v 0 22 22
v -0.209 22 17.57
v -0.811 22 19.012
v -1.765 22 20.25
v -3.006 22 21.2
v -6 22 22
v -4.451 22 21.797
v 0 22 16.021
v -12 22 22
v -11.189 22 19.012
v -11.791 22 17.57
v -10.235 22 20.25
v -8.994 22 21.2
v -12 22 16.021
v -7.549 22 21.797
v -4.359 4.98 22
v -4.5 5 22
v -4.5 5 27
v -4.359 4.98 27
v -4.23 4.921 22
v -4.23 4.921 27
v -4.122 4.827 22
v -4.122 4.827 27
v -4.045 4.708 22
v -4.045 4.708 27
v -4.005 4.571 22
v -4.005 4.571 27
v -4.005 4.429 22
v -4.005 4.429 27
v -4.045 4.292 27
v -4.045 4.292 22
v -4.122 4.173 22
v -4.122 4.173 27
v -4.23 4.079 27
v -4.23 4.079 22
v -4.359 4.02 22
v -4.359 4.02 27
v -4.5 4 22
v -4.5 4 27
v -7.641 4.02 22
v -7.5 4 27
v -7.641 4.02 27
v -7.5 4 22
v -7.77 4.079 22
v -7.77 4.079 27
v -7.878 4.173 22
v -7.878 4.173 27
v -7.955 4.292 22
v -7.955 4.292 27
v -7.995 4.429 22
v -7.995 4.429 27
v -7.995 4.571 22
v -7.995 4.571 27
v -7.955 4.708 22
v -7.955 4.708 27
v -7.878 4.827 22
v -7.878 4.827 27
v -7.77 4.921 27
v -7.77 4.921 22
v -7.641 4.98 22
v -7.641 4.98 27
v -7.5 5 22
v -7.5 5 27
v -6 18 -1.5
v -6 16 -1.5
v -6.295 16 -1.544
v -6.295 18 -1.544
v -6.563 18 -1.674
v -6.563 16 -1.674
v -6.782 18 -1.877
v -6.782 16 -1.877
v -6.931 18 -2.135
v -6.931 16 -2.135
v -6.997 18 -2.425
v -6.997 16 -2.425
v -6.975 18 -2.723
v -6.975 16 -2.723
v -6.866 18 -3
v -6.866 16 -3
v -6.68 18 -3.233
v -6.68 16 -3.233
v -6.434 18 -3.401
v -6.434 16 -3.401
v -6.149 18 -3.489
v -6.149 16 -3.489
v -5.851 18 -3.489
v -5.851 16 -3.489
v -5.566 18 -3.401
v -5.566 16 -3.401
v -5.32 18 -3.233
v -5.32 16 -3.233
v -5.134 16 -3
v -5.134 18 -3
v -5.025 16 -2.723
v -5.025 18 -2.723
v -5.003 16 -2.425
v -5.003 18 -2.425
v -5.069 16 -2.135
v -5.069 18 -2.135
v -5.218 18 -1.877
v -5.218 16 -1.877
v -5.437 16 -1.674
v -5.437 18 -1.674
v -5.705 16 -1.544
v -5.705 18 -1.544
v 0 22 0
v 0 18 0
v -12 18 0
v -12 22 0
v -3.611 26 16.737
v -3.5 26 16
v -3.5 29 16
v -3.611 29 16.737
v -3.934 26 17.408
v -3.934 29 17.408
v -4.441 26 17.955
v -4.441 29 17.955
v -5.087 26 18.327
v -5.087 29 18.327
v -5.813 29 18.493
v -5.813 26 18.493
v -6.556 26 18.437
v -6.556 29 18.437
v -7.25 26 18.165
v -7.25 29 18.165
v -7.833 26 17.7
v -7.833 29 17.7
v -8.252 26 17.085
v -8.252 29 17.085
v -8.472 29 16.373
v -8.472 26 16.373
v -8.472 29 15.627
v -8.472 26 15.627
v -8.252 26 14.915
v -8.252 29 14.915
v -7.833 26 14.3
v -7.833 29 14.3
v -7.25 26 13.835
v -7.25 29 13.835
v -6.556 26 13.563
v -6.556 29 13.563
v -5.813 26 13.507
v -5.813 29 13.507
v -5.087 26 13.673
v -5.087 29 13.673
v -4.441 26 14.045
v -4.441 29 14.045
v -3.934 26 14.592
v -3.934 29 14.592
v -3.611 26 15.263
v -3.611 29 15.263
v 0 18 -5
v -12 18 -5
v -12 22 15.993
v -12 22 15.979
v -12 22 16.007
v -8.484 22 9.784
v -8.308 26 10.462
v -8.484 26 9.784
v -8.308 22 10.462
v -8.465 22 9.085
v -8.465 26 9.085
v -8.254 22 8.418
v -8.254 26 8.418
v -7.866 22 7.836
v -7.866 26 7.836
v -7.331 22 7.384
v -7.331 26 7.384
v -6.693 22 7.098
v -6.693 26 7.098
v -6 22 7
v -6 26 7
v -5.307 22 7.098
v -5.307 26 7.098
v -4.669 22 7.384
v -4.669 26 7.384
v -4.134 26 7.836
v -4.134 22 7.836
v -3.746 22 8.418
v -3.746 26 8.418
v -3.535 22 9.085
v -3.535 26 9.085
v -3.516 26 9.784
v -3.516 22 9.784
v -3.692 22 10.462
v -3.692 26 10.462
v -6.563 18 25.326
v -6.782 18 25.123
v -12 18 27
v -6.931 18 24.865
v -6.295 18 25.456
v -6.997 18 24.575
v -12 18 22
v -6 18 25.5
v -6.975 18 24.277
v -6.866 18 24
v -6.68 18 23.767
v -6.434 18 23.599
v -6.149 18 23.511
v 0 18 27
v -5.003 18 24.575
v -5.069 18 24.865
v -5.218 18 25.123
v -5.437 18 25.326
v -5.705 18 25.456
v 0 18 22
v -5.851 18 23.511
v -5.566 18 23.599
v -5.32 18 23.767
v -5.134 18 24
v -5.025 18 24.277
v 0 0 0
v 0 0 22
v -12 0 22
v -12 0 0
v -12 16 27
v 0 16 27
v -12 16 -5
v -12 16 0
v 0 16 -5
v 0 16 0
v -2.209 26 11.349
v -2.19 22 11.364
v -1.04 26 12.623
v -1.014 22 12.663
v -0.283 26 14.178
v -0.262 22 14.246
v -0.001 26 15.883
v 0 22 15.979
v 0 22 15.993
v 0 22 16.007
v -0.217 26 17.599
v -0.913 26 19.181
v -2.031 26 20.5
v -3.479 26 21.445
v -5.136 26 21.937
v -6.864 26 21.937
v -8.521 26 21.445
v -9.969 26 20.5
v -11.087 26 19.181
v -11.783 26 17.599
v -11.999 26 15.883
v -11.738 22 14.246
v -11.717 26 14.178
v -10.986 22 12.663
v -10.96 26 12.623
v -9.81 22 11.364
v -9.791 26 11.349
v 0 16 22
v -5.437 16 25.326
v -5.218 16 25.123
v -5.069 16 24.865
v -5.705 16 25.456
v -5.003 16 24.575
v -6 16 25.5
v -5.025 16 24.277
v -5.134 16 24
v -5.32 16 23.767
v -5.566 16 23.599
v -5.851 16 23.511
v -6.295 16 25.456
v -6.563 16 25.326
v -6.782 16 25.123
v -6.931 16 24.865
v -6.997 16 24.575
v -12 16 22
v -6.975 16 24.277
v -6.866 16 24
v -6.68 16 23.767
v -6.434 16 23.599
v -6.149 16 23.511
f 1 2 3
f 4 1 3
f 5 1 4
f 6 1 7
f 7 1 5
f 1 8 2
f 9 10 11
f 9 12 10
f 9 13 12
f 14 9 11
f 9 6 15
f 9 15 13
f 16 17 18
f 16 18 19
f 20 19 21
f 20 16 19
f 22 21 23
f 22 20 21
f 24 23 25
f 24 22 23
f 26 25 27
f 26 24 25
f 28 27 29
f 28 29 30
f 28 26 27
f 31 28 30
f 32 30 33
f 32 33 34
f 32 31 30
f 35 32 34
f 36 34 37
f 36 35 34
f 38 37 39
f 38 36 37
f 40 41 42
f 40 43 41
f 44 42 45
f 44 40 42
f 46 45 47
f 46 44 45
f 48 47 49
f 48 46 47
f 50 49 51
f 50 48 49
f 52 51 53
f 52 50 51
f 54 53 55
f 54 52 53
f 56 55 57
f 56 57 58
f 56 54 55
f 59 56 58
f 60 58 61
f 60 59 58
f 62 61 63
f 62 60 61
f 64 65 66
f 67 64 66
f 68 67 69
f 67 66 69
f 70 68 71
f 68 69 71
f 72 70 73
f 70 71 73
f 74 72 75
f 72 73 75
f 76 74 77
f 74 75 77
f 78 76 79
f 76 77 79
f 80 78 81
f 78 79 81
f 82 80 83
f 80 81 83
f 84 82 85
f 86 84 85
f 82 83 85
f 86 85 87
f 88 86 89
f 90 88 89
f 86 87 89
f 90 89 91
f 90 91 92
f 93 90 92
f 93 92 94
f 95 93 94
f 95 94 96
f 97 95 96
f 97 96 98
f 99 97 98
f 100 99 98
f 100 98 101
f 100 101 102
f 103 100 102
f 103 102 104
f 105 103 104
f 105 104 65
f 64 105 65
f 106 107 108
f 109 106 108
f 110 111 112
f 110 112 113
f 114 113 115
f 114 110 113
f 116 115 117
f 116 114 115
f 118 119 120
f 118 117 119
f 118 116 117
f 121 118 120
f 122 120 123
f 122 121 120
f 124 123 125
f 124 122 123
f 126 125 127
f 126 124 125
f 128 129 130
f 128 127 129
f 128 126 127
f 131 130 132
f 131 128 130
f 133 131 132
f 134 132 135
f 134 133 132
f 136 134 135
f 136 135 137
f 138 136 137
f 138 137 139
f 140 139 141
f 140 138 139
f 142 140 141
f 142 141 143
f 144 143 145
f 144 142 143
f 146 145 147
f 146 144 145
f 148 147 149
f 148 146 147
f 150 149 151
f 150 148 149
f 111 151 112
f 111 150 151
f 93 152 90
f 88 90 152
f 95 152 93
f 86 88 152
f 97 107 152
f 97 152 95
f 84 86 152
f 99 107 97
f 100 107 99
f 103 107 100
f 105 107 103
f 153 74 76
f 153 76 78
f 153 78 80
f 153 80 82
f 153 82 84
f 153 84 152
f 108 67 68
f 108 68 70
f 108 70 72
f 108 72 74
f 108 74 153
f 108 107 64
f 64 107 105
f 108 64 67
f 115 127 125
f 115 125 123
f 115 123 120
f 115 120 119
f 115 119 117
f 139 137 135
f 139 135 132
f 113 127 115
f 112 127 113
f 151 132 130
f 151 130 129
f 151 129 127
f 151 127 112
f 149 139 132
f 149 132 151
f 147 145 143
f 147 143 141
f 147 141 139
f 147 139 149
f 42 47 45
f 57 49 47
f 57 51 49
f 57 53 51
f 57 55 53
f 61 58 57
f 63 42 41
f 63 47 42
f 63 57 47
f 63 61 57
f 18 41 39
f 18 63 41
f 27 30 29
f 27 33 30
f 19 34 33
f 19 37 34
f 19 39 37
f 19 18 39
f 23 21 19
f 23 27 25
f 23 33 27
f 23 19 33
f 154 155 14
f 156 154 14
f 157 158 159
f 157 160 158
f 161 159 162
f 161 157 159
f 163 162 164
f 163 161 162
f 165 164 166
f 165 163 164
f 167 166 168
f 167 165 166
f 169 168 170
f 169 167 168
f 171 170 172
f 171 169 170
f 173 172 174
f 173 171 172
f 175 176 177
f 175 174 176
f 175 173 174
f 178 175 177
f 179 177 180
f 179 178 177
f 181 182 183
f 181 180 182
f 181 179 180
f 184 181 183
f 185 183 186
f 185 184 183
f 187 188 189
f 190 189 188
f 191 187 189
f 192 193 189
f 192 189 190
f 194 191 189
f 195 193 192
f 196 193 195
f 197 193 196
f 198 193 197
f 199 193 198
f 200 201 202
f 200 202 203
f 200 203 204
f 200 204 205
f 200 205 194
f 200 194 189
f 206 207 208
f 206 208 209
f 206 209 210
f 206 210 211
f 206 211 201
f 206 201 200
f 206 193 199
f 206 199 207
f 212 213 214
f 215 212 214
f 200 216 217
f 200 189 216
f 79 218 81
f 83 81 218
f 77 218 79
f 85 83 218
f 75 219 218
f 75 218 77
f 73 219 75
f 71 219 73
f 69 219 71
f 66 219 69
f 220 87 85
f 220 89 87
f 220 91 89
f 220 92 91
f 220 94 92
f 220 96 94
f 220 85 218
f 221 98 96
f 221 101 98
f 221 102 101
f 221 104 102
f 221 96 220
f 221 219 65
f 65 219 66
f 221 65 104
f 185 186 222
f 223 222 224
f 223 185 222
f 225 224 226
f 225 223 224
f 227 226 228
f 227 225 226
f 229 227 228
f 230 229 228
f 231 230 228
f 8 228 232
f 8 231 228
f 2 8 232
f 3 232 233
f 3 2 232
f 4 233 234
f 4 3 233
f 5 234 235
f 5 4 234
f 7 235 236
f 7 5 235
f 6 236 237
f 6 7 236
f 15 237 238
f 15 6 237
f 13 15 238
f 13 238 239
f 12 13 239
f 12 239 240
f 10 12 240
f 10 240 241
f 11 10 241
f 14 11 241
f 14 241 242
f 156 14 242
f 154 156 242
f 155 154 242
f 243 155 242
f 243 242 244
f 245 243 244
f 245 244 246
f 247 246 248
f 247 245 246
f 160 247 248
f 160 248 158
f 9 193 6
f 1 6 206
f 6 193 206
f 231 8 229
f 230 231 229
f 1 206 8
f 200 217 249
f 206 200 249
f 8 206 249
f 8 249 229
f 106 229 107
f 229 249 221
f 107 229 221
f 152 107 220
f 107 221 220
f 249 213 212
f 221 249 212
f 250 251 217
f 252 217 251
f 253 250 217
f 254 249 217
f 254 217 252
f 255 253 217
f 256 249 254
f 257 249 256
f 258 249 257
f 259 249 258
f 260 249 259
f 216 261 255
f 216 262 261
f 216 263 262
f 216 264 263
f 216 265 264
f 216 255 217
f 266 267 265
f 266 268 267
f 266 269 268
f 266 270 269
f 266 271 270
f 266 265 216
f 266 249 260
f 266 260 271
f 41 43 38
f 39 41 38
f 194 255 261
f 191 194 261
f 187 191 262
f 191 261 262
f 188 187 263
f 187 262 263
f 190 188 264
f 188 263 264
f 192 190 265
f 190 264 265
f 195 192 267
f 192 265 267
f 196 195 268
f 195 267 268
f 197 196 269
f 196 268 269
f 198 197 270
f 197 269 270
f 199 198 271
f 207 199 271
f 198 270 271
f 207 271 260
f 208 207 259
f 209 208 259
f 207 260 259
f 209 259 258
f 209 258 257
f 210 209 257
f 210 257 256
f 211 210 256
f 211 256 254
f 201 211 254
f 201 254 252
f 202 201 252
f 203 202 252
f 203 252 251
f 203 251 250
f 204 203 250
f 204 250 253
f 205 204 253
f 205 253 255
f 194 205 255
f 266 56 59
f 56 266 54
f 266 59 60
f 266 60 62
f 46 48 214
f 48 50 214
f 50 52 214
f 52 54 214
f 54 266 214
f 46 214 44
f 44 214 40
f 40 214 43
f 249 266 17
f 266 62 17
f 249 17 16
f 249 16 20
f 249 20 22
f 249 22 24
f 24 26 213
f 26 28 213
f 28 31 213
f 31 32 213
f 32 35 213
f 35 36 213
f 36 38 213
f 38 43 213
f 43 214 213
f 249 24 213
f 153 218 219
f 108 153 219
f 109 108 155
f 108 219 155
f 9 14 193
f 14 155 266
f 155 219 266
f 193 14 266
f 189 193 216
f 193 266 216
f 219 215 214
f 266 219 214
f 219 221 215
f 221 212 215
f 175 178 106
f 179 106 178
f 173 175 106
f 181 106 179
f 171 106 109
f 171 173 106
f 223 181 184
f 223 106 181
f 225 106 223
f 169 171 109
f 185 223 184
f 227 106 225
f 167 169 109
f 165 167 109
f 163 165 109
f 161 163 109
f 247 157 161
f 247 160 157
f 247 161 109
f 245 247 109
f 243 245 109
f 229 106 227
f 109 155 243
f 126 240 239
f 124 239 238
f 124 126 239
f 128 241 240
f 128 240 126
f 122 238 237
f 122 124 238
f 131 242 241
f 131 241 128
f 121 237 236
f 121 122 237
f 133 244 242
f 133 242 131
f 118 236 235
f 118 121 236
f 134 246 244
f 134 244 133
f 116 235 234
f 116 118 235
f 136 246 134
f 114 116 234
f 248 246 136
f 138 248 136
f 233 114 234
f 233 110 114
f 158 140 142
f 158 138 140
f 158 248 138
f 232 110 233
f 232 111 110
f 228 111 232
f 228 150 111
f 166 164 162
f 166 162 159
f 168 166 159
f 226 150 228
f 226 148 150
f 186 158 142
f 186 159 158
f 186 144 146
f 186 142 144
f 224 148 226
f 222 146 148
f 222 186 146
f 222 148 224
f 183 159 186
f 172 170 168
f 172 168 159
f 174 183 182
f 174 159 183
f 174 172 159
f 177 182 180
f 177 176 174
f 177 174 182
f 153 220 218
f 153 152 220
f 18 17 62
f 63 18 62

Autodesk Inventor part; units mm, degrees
ref_plane "YZ Plane" through (0, 0, 0) normal (1, 0, 0) x (0, 1, 0)
ref_plane "XZ Plane" through (0, 0, 0) normal (0, 1, 0) x (-1, 0, 0)
ref_plane "XY Plane" through (0, 0, 0) normal (0, 0, 1) x (1, 0, 0)
sketch "Szkic1" plane through (0, 0, 0) normal (0, 1, 0) x (-1, 0, 0)
  line L0 (0, 0) -> (12, 0)
  line L1 (12, 0) -> (12, 22)
  line L2 (12, 22) -> (0, 22)
  line L3 (0, 22) -> (0, 0)
  dimension "d0" = 12
  dimension "d1" = 22
extrude "Wyciągnięcie proste1" add sketch "Szkic1" along normal blind 22
sketch "Szkic2" plane through (-12, 0, 22) normal (0, 0, 1) x (1, 0, 0)
  line L0 (0, 0) -> (0, 22) projected
  line L1 (12, 0) -> (12, 22) projected
  line L2 (0, 18) -> (12, 18)
  line L3 (12, 18) -> (12, 16)
  line L4 (12, 16) -> (0, 16)
  line L5 (0, 16) -> (0, 18)
  line L6 (0, 22) -> (12, 22) projected
  dimension "d4" = 2
  dimension "d5" = 4
extrude "Wyciągnięcie proste2" add sketch "Szkic2" along normal blind 5 contours L0 L2 L1 L4
sketch "Szkic3" plane through (0, 0, 0) normal (0, 0, -1) x (-1, 0, 0)
  line L0 (0, 16) -> (0, 18) projected
  line L1 (12, 16) -> (0, 16) projected
  line L2 (0, 18) -> (12, 18)
  line L3 (12, 18) -> (12, 16)
  line L4 (12, 16) -> (0, 16)
  line L5 (0, 16) -> (0, 18)
  point P0 (0, 0)
extrude "Wyciągnięcie proste3" add sketch "Szkic3" along normal blind 5
sketch "Szkic4" plane through (-12, 18, 0) normal (0, 1, 0) x (1, 0, 0)
  line L0 (0, 5) -> (12, 5) projected
  point P0 (12, 0)
  point P1 (6, 2.5)
  point P2 (6, -24.839)
  dimension "d10" = 2.5
hole "Otwór1" at (-6, 18, -2.5) direction (0, -1, 0) diameter 2 end through all
sketch "Szkic5" plane through (-12, 18, 22) normal (0, 1, 0) x (1, 0, 0)
  line L0 (12, -5) -> (0, -5) projected
  point P0 (12, 22)
  point P1 (6, -2.5)
  dimension "d18" = 2.5
hole "Otwór2" at (-6, 18, 24.5) direction (0, -1, 0) diameter 2 end through all
sketch "Szkic6" plane through (0, 22, 0) normal (0, 1, 0) x (1, 0, 0)
  line L0 (-12, -22) -> (0, -22) projected
  arc A0 (-8.3077, -10.4615) -> (-3.6923, -10.4615) centre (-6, -16) ccw
  line L1 (0, 0) -> (-12, 0) projected
  arc A1 (-3.6923, -10.4615) -> (-8.3077, -10.4615) centre (-6, -9.5) ccw
  dimension "d26" = 6
  dimension "d27" = 9.5
  dimension "d28" = 5
extrude "Wyciągnięcie proste4" add sketch "Szkic6" along normal blind 4
sketch "Szkic7" plane through (0, 26, 0) normal (0, 1, 0) x (1, 0, 0)
  circle A0 centre (-6, -16) radius 2.5
  arc A1 (-8.3077, -10.4615) -> (-3.6923, -10.4615) centre (-6, -16) ccw projected
  point P0 (0, 0)
  dimension "d31" = 5
extrude "Wyciągnięcie proste5" add sketch "Szkic7" along normal blind 3
sketch "Szkic8" plane through (-12, 0, 22) normal (0, 0, 1) x (1, 0, 0)
  line L0 (4.5, 4) -> (7.5, 4)
  line L1 (8, 4.5) -> (8, 4.5)
  line L2 (7.5, 5) -> (4.5, 5)
  line L3 (4, 4.5) -> (4, 4.5)
  line L4 (0, 0) -> (12, 0) projected
  line L5 (12, 0) -> (12, 16) projected
  arc A0 (4.5, 5) -> (4, 4.5) centre (4.5, 4.5) ccw
  arc A1 (4, 4.5) -> (4.5, 4) centre (4.5, 4.5) ccw
  arc A2 (8, 4.5) -> (7.5, 5) centre (7.5, 4.5) ccw
  arc A3 (7.5, 4) -> (8, 4.5) centre (7.5, 4.5) ccw
  point P0 (8, 5)
  point P1 (8, 4)
  point P2 (4, 5)
  dimension "d34" = 4
  dimension "d35" = 1
  dimension "d36" = 4
  dimension "d37" = 4
  dimension "d38" = 0.5
extrude "Wyciągnięcie proste6" add sketch "Szkic8" along normal blind 5
properties part number "towerpro"
